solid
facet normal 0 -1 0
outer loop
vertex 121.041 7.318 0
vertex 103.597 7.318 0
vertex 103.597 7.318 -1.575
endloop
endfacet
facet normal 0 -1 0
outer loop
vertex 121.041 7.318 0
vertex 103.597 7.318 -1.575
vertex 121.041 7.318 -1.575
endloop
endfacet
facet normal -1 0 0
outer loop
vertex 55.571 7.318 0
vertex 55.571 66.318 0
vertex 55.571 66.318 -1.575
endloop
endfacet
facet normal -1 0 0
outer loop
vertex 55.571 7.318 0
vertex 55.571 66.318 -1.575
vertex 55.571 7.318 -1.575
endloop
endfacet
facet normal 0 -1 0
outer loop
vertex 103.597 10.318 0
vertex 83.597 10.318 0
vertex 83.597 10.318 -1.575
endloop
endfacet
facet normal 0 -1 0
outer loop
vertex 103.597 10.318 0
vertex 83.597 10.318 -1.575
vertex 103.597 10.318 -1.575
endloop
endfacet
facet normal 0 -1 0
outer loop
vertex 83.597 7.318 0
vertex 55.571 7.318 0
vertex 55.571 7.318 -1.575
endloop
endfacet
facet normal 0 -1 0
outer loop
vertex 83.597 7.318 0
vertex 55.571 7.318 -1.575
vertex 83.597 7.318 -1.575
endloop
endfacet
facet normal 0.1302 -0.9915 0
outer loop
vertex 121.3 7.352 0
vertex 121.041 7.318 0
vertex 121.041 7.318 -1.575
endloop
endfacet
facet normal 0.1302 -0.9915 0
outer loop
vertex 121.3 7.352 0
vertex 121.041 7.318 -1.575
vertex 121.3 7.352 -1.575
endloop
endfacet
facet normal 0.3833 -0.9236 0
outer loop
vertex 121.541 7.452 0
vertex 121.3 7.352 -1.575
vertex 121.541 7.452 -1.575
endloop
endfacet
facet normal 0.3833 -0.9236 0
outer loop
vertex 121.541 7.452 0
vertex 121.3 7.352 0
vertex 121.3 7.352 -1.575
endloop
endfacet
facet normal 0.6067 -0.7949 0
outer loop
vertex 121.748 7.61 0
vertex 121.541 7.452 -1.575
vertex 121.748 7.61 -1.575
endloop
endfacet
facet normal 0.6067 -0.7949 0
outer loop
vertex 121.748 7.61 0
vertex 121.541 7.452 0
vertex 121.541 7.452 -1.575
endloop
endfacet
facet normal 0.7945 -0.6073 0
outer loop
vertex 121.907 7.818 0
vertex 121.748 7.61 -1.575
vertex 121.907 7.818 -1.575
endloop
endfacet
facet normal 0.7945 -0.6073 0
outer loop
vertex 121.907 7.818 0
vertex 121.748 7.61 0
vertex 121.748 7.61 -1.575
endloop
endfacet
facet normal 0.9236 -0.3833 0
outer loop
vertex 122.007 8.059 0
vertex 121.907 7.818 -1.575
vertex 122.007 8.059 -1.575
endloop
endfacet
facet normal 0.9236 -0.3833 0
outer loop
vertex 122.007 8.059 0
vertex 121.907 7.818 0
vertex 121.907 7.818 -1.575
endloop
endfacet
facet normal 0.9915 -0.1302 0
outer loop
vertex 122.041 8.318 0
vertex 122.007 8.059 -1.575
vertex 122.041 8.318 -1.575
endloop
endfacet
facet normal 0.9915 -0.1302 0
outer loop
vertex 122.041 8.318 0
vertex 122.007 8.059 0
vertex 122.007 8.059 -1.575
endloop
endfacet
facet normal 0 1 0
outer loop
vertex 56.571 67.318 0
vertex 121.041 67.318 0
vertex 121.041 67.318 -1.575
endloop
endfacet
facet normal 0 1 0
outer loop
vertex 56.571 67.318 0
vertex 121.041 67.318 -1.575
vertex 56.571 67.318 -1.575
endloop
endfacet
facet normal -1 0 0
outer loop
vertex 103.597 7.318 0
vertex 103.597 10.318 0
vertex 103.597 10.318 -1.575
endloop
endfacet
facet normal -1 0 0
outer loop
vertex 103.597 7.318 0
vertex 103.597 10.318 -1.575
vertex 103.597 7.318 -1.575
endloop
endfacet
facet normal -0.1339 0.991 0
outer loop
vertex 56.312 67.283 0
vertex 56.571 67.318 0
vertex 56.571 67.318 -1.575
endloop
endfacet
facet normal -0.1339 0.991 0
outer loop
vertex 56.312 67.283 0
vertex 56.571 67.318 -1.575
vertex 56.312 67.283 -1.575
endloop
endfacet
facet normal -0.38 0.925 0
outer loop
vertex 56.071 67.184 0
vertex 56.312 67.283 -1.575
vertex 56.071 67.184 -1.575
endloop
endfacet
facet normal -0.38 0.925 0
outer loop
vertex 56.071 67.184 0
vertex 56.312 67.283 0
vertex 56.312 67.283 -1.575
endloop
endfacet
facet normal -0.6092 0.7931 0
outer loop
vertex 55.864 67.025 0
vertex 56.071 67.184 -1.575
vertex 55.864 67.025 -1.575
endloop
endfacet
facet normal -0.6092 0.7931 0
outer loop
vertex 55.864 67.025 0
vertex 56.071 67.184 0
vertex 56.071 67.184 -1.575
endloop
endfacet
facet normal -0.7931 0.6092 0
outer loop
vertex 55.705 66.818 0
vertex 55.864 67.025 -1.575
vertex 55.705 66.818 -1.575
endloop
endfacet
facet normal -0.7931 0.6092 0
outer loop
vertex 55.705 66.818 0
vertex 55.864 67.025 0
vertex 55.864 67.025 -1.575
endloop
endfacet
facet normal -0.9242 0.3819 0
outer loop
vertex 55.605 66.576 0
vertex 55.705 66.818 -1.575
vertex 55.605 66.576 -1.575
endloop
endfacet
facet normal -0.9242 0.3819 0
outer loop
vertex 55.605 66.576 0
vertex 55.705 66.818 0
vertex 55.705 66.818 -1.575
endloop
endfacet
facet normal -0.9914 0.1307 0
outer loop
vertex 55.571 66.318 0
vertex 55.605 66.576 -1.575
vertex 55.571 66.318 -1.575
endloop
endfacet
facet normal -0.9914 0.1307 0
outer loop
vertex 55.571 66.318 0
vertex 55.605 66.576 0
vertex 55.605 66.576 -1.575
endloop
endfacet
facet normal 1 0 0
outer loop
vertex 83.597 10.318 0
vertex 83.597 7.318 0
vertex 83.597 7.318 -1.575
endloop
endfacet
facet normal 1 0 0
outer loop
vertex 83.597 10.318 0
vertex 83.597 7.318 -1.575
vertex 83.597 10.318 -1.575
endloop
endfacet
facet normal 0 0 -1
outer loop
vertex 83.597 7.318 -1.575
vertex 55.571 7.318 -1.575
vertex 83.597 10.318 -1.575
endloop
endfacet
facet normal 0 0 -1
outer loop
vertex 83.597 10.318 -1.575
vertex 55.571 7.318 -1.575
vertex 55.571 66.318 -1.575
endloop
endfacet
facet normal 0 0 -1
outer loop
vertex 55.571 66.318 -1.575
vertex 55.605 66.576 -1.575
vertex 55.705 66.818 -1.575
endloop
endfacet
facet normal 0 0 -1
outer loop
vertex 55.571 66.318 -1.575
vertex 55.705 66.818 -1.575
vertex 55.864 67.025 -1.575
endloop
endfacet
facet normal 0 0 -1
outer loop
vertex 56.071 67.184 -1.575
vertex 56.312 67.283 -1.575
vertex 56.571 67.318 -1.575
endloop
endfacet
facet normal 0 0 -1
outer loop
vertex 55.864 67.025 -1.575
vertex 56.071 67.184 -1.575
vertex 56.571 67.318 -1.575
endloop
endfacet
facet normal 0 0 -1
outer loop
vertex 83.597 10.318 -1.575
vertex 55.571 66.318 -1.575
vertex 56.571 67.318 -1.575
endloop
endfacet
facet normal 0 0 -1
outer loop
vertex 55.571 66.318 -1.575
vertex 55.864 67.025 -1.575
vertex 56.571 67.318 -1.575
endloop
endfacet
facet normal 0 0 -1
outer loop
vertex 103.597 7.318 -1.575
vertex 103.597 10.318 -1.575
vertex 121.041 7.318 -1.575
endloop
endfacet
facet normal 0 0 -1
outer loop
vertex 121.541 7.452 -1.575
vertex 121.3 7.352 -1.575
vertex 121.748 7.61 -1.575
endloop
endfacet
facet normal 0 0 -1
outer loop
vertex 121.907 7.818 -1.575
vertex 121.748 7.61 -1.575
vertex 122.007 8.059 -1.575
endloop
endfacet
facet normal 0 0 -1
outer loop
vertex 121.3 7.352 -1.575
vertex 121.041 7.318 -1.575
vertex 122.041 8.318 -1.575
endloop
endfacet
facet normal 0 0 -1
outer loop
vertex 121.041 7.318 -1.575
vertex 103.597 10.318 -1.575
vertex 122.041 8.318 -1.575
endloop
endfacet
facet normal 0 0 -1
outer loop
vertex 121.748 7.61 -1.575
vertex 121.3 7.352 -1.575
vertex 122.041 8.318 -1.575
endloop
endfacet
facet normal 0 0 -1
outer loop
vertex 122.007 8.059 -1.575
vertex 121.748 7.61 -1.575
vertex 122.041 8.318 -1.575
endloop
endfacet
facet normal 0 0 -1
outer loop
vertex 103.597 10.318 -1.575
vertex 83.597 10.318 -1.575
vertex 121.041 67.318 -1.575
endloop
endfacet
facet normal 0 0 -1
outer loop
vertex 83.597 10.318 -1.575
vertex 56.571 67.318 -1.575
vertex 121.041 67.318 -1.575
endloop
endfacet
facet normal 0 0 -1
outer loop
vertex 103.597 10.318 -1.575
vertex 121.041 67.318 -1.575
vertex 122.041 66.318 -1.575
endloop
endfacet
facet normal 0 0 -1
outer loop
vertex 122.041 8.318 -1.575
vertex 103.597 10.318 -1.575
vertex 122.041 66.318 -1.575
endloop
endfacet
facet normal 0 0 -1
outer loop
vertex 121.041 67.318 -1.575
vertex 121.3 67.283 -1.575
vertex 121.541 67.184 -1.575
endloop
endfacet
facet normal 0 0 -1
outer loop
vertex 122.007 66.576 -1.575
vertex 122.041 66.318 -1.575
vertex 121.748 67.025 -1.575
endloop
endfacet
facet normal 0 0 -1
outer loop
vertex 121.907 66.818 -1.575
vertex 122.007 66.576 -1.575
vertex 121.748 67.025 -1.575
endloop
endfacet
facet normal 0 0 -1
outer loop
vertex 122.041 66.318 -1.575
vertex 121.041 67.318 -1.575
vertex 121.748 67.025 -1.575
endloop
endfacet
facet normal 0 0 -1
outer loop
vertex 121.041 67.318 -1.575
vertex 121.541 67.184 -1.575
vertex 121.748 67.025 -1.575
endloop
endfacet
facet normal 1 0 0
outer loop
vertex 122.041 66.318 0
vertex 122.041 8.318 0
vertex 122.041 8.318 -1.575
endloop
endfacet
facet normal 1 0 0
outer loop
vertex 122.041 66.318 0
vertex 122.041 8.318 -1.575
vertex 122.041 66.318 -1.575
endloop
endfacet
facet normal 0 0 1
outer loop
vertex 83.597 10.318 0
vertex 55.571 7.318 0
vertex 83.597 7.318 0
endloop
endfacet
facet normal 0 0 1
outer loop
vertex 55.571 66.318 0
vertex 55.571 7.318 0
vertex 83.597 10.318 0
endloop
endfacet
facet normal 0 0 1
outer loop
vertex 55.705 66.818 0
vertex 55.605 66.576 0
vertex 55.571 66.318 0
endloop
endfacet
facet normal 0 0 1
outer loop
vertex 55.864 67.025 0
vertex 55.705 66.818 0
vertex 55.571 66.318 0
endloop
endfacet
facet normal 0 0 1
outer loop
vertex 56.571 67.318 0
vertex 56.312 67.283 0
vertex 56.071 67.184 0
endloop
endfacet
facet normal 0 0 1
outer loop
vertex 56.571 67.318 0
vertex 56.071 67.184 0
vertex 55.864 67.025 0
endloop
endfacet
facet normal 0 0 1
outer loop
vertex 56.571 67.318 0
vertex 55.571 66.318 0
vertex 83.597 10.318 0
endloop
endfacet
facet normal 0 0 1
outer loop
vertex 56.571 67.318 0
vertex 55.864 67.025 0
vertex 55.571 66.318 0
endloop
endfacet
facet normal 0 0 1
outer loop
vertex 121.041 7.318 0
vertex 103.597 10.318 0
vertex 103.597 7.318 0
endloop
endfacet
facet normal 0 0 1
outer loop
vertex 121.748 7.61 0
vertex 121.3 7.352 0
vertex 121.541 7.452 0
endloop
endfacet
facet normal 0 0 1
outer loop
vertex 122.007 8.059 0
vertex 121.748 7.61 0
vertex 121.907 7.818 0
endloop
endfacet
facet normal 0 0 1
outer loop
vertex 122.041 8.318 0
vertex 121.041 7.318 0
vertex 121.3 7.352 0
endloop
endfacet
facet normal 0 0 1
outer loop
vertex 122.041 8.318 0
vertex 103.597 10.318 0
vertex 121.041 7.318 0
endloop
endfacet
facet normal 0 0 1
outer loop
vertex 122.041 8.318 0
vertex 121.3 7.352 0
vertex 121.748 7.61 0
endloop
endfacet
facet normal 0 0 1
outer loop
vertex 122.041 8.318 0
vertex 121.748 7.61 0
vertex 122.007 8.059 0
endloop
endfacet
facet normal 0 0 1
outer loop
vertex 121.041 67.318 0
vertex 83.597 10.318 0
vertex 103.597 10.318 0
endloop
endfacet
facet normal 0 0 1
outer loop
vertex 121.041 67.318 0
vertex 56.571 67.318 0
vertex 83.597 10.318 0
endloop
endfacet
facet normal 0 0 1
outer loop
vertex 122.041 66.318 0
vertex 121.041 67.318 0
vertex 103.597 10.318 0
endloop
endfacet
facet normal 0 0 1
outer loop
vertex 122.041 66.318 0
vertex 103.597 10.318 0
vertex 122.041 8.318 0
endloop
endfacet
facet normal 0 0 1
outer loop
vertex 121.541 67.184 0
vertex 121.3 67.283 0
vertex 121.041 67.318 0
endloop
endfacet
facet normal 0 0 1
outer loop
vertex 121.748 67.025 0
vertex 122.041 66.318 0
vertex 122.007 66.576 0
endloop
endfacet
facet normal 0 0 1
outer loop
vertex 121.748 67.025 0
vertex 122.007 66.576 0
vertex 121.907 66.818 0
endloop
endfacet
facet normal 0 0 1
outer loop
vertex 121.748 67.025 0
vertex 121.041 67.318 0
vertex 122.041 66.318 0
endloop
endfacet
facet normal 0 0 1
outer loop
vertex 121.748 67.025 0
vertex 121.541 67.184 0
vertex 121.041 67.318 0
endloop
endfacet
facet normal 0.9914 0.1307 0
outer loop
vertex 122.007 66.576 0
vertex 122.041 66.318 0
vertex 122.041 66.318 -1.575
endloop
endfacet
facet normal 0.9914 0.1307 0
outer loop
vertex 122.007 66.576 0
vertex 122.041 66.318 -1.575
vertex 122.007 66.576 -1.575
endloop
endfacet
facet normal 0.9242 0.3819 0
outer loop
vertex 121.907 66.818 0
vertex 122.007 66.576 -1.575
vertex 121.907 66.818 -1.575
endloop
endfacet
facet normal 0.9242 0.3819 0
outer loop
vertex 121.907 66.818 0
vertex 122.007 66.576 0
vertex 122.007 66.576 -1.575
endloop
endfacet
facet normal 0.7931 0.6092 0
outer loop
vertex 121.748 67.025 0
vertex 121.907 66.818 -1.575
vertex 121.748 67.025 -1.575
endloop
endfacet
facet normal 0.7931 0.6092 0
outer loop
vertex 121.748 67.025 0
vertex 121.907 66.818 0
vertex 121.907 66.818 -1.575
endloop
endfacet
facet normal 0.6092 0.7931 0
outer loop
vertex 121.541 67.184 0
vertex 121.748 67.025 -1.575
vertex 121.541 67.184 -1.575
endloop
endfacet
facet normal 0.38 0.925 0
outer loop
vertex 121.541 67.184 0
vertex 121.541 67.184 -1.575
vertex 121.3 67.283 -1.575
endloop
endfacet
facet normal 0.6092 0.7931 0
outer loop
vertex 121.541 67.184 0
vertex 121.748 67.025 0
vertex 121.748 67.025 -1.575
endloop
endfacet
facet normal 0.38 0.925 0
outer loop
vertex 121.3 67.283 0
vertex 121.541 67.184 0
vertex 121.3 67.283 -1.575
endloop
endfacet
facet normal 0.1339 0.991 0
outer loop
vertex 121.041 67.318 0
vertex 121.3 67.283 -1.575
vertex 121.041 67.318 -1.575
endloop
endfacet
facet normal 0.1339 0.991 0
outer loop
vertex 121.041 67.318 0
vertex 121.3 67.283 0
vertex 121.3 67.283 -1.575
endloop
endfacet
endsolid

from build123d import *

# Parameters (mm, degrees)
BOSS_EXTRUDE1_DEPTH = 1.5748


with BuildPart() as part:
    # BPR2 PCB Outline → Boss-Extrude1 (new body)
    with BuildSketch(Plane.XY):
        with BuildLine():
            Line((83.596984325, 7.317563979), (83.596984325, 10.317563979))
            Line((83.596984325, 10.317563979), (103.596984325, 10.317563979))
            Line((103.596984325, 10.317563979), (103.596984325, 7.317563979))
            Line((103.596984325, 7.317563979), (121.040984325, 7.317563979))
            ThreePointArc((121.040984325, 7.317563979), (121.748091106, 7.610457198), (122.040984325, 8.317563979))
            Line((122.040984325, 8.317563979), (122.040984325, 66.317563979))
            ThreePointArc((122.040984325, 66.317563979), (121.748091106, 67.02467076), (121.040984325, 67.317563979))
            Line((121.040984325, 67.317563979), (56.570984325, 67.317563979))
            ThreePointArc((56.570984325, 67.317563979), (55.863877543, 67.02467076), (55.570984325, 66.317563979))
            Line((55.570984325, 66.317563979), (55.570984325, 7.317563979))
            Line((55.570984325, 7.317563979), (83.596984325, 7.317563979))
        make_face()
    extrude(amount=-BOSS_EXTRUDE1_DEPTH)


solid = part.part
